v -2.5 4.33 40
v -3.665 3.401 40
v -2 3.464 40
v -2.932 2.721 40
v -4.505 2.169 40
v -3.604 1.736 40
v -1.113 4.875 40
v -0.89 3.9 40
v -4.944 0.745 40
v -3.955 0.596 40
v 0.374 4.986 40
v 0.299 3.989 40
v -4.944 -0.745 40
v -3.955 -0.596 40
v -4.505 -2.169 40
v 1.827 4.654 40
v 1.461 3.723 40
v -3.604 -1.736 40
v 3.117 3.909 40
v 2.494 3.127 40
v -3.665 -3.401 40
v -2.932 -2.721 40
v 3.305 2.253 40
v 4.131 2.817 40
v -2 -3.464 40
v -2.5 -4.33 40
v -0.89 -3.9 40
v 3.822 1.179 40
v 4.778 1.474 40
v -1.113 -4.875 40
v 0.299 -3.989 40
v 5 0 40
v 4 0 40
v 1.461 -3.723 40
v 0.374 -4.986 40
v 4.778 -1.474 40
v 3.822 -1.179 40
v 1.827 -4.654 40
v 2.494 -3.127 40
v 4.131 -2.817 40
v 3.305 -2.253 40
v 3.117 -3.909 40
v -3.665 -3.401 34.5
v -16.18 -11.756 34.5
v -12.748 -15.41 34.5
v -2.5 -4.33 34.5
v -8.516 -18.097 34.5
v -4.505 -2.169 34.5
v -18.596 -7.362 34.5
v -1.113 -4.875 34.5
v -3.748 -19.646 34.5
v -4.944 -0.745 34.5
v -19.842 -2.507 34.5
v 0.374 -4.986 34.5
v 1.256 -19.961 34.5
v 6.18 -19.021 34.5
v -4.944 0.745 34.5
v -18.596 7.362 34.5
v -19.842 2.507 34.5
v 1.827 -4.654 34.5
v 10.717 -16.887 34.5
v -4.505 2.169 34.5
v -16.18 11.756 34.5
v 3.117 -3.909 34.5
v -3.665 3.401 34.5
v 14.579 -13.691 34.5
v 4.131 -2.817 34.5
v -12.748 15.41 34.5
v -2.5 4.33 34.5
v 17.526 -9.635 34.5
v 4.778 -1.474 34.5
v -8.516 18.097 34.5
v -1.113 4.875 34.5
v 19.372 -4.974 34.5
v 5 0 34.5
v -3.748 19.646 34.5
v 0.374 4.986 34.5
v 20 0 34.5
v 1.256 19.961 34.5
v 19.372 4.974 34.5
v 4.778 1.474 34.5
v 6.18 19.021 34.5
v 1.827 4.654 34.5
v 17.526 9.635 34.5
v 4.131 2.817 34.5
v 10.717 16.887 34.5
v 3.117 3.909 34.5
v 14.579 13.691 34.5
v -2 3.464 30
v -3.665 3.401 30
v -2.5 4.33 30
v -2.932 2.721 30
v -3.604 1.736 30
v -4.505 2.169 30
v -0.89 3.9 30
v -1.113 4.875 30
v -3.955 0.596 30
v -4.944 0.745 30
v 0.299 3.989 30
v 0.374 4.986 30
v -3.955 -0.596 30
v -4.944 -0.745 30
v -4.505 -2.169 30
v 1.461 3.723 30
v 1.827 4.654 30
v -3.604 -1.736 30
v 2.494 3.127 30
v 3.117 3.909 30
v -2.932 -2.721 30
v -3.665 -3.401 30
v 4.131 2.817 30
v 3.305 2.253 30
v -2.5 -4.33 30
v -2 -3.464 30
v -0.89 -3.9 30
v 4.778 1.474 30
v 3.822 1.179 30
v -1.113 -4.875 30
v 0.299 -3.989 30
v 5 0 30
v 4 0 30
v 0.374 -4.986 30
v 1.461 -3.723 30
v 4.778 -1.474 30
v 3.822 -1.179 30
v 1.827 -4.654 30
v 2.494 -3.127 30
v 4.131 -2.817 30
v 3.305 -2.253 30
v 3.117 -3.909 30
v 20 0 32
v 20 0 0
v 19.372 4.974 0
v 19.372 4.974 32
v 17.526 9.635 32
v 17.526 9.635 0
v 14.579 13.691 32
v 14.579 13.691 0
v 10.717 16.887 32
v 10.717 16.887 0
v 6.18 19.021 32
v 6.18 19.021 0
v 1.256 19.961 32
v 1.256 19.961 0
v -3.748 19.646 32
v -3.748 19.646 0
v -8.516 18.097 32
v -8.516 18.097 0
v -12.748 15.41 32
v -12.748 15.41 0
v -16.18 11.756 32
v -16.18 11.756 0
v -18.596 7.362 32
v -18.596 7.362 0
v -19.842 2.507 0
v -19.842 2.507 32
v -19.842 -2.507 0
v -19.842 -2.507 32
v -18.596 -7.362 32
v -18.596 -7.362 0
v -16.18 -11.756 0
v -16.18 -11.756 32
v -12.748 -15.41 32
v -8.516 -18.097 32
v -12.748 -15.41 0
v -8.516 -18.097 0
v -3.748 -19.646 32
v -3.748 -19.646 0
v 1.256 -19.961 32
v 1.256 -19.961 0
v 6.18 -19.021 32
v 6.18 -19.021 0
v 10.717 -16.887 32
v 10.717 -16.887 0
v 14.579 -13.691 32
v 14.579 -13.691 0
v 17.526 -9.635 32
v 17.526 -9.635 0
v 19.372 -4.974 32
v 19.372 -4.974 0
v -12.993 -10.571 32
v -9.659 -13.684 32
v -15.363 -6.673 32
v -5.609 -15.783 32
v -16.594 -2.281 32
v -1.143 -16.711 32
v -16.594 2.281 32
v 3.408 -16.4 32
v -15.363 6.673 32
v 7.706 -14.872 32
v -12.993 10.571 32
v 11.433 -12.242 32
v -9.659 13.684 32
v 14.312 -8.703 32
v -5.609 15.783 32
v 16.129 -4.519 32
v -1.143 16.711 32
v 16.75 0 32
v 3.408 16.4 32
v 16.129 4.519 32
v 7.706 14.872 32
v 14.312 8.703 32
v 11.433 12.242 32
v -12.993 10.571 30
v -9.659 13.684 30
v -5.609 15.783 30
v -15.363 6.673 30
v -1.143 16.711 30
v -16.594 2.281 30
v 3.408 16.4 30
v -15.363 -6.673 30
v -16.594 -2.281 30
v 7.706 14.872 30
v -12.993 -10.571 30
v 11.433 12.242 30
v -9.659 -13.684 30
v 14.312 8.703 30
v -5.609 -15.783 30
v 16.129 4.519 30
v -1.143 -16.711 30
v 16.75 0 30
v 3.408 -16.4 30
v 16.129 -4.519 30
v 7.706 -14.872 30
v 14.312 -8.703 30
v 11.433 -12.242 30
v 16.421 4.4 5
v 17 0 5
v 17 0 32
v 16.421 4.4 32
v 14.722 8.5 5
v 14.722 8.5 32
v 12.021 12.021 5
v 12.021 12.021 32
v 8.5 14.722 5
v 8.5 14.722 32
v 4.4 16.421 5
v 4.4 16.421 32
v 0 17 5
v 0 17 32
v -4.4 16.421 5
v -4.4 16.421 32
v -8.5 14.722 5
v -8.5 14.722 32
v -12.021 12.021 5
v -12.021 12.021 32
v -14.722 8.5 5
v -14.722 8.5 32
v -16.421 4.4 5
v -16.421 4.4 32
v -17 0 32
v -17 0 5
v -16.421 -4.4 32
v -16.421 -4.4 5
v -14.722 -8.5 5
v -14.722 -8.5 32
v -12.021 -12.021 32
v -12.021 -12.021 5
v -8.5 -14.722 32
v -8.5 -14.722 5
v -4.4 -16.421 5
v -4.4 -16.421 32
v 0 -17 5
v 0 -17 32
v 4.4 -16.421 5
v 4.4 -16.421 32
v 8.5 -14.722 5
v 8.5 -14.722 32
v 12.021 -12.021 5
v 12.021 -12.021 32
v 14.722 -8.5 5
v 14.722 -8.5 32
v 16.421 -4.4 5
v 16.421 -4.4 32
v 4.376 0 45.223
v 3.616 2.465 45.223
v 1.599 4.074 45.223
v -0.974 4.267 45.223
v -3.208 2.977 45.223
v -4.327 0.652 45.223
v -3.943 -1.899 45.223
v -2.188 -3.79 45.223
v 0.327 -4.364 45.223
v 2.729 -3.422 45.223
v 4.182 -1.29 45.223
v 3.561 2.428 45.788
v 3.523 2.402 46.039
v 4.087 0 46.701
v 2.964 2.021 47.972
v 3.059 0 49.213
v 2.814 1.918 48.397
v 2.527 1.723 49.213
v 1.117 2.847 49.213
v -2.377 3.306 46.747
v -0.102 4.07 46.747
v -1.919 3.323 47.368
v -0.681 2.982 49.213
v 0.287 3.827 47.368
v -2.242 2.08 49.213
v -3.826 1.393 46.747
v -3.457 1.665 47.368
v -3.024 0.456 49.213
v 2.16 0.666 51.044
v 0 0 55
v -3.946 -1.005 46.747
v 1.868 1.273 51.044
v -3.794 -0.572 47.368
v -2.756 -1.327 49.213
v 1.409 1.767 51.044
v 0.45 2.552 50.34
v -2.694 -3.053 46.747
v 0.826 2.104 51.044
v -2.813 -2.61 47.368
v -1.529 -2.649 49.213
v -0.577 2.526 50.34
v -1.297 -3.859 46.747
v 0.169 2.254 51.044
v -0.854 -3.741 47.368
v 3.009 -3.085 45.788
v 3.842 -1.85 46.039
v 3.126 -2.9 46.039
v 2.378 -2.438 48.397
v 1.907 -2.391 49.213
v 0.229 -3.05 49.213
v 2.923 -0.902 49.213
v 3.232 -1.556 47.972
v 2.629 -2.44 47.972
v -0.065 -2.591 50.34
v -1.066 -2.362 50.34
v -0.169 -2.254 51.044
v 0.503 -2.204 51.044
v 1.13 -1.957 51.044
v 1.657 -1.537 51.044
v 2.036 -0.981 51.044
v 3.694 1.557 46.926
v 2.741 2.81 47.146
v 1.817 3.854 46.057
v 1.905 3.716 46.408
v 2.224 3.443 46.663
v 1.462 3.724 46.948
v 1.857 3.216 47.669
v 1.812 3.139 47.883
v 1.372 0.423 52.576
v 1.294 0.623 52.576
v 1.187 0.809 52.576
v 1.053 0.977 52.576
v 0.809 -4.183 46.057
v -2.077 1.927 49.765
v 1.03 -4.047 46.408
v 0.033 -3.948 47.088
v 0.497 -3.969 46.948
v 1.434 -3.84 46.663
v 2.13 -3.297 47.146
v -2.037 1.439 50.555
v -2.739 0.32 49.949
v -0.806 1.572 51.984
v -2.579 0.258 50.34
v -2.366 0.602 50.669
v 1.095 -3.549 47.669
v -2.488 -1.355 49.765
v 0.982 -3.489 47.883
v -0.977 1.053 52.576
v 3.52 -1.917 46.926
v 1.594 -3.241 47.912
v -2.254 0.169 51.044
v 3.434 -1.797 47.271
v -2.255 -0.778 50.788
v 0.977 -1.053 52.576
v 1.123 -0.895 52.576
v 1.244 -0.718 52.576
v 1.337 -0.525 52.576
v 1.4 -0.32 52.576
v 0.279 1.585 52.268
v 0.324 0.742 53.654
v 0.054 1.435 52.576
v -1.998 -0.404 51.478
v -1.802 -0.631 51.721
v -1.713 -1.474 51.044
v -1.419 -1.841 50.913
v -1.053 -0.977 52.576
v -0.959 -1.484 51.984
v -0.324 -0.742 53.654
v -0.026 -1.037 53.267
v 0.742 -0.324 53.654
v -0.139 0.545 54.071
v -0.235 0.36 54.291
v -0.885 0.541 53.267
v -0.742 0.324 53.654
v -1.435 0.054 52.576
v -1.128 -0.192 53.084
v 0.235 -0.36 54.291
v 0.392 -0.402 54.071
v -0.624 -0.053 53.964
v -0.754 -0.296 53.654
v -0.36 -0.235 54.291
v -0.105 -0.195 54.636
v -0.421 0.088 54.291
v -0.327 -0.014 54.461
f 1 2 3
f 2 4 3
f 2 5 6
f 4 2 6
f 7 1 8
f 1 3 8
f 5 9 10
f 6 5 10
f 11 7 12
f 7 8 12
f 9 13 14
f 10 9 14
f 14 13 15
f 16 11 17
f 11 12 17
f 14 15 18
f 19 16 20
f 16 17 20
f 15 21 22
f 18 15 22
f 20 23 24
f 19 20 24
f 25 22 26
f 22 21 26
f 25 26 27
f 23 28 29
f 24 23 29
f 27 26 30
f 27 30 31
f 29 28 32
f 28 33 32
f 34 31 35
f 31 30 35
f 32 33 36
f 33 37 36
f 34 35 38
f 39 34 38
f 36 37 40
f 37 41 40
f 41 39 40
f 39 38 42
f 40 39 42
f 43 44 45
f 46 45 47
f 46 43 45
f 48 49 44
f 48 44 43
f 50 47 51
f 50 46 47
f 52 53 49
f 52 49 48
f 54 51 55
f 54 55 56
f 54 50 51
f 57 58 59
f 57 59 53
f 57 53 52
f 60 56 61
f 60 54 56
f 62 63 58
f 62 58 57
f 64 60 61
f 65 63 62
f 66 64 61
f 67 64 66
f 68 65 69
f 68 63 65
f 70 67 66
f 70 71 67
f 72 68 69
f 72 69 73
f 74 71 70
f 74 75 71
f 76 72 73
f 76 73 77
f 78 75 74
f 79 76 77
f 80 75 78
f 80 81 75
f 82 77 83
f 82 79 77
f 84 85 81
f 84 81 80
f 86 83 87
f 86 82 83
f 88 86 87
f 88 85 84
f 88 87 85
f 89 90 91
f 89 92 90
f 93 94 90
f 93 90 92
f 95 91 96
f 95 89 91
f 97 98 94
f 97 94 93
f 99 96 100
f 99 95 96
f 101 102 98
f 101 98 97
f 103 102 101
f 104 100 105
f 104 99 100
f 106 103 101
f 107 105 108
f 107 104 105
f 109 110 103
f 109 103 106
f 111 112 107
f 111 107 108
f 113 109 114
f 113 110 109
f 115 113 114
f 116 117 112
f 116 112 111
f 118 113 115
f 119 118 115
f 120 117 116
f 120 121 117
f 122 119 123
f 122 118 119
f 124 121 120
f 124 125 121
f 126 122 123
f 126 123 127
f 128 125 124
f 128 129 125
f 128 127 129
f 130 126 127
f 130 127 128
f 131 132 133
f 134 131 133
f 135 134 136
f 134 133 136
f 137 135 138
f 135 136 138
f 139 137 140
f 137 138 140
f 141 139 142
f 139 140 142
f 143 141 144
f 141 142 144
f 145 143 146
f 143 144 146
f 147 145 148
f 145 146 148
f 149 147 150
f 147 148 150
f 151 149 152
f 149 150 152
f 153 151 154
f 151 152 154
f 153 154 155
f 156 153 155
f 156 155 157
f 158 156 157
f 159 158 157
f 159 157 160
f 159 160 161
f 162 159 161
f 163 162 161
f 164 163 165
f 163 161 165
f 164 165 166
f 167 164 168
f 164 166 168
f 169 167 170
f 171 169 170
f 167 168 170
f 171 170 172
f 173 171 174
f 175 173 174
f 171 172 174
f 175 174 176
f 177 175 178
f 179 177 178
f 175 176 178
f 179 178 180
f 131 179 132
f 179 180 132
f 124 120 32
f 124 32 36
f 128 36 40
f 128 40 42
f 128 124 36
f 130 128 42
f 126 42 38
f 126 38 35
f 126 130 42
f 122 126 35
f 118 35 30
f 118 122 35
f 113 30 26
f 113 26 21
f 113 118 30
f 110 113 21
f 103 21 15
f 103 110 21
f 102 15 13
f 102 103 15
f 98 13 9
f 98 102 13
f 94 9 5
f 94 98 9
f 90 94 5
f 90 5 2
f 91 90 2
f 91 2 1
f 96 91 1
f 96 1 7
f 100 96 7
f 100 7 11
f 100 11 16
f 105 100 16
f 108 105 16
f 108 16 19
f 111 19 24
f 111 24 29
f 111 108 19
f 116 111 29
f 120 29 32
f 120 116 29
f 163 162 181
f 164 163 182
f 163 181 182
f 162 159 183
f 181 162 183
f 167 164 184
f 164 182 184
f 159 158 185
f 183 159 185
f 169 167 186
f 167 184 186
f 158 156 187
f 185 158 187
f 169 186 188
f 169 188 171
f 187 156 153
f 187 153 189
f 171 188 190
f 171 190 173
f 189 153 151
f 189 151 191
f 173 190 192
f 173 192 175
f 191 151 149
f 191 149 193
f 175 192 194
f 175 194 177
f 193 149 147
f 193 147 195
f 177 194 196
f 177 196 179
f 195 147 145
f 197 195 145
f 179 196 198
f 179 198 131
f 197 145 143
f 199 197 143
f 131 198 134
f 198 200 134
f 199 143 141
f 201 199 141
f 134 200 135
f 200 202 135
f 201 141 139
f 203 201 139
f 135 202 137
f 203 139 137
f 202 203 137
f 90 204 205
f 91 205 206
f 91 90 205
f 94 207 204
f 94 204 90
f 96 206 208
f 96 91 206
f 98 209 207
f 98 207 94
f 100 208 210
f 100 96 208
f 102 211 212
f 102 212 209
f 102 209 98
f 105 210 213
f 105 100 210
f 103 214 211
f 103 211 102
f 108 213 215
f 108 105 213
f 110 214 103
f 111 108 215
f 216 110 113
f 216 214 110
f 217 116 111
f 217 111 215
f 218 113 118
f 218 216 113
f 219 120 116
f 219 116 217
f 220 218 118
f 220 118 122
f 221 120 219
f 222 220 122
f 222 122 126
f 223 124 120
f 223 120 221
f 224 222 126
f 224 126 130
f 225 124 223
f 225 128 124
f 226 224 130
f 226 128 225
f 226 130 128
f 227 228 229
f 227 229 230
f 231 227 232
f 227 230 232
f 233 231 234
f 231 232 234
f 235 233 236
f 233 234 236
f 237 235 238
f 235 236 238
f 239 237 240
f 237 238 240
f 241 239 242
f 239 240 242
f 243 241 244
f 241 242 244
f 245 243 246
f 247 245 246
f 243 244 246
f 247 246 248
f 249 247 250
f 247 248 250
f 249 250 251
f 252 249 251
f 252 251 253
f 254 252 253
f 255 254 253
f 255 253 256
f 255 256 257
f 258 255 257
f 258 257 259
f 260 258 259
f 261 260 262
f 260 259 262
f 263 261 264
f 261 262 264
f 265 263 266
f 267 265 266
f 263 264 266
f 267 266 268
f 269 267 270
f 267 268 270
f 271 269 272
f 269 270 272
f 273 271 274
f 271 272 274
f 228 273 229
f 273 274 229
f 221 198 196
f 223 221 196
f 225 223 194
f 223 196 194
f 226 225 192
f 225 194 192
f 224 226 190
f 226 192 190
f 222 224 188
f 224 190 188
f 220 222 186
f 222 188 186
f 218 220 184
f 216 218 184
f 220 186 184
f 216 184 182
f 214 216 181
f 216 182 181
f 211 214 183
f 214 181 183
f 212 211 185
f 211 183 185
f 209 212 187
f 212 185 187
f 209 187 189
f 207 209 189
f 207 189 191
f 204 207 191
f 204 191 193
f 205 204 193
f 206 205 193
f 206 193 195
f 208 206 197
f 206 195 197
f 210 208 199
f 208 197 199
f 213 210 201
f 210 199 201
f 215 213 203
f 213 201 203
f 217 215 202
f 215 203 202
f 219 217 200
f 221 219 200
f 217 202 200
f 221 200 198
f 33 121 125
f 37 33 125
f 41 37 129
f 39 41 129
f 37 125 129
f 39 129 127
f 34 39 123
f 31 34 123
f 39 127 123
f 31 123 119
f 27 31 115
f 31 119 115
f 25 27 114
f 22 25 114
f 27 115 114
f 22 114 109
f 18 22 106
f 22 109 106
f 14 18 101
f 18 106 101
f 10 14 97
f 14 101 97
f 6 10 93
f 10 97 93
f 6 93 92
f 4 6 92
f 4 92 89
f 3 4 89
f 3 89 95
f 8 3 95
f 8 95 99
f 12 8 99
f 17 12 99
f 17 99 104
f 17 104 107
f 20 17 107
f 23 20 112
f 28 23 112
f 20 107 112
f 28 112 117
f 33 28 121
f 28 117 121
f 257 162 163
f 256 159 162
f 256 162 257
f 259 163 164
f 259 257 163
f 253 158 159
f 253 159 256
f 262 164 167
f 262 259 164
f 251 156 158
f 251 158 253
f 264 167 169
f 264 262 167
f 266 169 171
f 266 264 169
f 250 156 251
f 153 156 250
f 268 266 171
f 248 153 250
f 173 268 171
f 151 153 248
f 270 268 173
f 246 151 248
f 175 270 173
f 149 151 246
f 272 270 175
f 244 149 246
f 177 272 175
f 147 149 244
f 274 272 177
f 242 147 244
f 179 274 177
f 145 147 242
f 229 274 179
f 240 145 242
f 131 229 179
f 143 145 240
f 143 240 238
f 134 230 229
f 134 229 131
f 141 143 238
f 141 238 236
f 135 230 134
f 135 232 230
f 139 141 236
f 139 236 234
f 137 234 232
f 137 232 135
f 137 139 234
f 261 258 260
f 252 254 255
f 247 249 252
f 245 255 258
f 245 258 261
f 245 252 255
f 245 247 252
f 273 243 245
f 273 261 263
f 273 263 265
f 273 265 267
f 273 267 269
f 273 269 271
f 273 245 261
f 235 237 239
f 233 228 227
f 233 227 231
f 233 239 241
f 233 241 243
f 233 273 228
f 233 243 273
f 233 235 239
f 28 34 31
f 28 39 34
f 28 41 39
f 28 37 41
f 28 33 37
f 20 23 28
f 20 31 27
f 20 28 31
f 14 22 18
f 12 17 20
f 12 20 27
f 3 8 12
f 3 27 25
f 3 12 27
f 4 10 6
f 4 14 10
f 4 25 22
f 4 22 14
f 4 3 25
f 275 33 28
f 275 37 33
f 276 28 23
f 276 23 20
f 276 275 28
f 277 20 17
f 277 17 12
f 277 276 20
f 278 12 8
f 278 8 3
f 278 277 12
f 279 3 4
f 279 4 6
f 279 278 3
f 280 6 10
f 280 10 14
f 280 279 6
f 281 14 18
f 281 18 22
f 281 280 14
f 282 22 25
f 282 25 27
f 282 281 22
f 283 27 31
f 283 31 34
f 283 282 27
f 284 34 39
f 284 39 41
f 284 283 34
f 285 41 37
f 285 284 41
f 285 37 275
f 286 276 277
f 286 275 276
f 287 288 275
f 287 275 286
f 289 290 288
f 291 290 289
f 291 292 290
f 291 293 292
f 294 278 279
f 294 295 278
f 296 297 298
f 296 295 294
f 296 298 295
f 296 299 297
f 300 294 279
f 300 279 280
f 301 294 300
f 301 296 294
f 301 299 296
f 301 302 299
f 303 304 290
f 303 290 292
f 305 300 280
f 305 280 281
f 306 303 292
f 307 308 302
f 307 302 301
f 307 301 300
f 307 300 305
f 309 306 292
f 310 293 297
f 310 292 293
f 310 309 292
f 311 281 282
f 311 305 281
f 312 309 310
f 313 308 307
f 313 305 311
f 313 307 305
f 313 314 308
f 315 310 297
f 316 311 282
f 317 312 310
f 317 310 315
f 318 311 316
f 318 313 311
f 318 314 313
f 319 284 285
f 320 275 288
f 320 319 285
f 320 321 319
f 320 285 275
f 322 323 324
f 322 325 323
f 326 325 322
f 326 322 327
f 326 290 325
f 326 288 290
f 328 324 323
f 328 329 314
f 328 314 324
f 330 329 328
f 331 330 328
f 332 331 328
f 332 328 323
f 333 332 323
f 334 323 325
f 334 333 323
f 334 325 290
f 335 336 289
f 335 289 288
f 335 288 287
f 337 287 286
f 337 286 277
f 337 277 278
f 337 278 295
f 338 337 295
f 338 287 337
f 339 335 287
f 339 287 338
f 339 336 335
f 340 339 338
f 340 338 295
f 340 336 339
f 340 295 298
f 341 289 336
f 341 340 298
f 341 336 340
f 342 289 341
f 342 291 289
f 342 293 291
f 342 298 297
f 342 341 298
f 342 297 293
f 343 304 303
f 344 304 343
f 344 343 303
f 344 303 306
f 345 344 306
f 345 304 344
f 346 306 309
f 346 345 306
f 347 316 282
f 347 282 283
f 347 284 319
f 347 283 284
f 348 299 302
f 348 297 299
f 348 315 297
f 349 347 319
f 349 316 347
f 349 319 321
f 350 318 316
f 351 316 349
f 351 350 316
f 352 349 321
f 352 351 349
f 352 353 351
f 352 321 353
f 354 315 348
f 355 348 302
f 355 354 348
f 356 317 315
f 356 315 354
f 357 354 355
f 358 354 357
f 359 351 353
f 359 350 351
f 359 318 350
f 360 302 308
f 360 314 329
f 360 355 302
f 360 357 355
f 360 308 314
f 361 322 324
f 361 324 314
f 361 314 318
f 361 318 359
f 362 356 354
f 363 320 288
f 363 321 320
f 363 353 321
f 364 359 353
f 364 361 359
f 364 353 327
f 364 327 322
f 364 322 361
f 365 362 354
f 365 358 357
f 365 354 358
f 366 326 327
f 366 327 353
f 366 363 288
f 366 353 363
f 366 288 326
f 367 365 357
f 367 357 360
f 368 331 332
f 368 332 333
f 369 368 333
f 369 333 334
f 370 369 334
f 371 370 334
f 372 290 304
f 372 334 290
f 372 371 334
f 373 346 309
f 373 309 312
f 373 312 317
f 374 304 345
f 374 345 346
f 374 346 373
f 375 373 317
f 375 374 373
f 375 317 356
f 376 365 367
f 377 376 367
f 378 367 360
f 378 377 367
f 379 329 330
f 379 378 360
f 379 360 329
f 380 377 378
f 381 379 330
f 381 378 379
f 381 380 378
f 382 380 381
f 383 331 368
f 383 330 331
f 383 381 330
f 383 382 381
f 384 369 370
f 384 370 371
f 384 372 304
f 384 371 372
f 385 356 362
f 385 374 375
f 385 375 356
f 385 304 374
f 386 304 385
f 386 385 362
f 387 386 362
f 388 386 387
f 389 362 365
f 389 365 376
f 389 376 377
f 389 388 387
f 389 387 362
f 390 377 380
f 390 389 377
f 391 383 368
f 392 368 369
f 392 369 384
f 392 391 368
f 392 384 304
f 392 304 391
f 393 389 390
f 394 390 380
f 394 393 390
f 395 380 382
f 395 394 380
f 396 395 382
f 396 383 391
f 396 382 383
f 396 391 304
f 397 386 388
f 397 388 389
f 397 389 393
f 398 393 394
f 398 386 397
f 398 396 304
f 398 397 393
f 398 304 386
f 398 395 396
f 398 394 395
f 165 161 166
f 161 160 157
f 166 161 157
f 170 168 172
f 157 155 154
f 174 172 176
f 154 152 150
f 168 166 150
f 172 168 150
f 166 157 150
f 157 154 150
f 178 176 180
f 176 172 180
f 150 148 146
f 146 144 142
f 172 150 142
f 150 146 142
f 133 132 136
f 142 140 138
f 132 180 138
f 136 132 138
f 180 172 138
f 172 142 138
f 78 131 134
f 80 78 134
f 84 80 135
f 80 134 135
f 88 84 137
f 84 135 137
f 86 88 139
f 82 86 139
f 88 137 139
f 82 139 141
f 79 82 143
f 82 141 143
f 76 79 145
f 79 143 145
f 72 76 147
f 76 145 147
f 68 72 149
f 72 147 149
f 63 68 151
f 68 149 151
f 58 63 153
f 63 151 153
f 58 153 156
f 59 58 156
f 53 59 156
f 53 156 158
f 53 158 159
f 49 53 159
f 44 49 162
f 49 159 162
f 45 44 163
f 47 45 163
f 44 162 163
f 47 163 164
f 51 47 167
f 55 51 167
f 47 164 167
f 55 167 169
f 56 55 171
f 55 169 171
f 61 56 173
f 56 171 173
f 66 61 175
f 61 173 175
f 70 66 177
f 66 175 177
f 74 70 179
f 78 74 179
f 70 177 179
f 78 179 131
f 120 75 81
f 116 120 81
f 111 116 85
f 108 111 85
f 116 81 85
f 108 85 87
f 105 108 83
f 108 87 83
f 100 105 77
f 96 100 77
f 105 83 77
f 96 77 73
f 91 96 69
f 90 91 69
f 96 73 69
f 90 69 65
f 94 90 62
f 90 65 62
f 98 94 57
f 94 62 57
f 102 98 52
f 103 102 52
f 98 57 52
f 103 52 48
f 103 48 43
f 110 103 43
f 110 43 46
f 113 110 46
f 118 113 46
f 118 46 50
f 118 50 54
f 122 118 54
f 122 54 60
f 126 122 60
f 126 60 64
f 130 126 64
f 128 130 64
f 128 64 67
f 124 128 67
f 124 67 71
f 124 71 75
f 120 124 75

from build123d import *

# Parameters (mm, degrees)
F0_R      = 20
F1_DEPTH  = 32
F2_R      = 17
F3_DEPTH  = 27
F4_R      = 20
F5_DEPTH  = 2.5
F6_R      = 16.75
F7_DEPTH  = 2
F8_R      = 5
F9_DEPTH  = 34.501
F10_R     = 5
F10_R_2   = 4
F11_DEPTH = 10


with BuildPart() as f1:
    # F0 (on Top) → F1 (new body)
    with BuildSketch(Plane.XY):
        Circle(F0_R)
    extrude(amount=F1_DEPTH)

    # F2 (on face) → F3 (cut)
    with BuildSketch(Plane.XY.offset(32)):
        Circle(F2_R)
    extrude(amount=-F3_DEPTH, mode=Mode.SUBTRACT)


with BuildPart() as f5:
    # F4 (on face) → F5 (new body)
    with BuildSketch(Plane.XY.offset(32)):
        Circle(F4_R)
    extrude(amount=F5_DEPTH)

    # F6 (on face) → F7 (join)
    with BuildSketch(Plane(origin=(0, 0, 32), x_dir=(1, 0, 0), z_dir=(0, 0, -1))):
        Circle(F6_R)
    extrude(amount=F7_DEPTH)

    # F8 (on face) → F9 (cut, through all)
    with BuildSketch(Plane.XY.offset(34.5)):
        Circle(F8_R)
    extrude(amount=-F9_DEPTH, mode=Mode.SUBTRACT)


with BuildPart() as f11:
    # F10 (on face) → F11 (new body)
    with BuildSketch(Plane(origin=(0, 0, 30), x_dir=(1, 0, 0), z_dir=(0, 0, -1))):
        Circle(F10_R)
        Circle(F10_R_2, mode=Mode.SUBTRACT)
    extrude(amount=-F11_DEPTH)


with BuildPart() as f13:
    # F12 (on Front) → F13 (revolve)
    with BuildSketch(Plane.XZ):
        with BuildLine():
            Line((0, 40), (4, 40))
            add(Edge.make_bspline(
                [(4, 40), (4.7016184977, 44.8760034117), (4.2048103253, 46.6204646024), (2.6956200107, 49.976672278), (2.3305378854, 51.1800907552), (0, 55)],
                knots=[0, 0, 0, 0, 0.4002344353, 0.6243843817, 1, 1, 1, 1], degree=3))
            Line((0, 55), (0, 40))
        make_face()
    revolve(axis=Axis((0, 0, 47.5), (0, 0, 1)))


solid = Compound([f1.part, f5.part, f11.part, f13.part])
